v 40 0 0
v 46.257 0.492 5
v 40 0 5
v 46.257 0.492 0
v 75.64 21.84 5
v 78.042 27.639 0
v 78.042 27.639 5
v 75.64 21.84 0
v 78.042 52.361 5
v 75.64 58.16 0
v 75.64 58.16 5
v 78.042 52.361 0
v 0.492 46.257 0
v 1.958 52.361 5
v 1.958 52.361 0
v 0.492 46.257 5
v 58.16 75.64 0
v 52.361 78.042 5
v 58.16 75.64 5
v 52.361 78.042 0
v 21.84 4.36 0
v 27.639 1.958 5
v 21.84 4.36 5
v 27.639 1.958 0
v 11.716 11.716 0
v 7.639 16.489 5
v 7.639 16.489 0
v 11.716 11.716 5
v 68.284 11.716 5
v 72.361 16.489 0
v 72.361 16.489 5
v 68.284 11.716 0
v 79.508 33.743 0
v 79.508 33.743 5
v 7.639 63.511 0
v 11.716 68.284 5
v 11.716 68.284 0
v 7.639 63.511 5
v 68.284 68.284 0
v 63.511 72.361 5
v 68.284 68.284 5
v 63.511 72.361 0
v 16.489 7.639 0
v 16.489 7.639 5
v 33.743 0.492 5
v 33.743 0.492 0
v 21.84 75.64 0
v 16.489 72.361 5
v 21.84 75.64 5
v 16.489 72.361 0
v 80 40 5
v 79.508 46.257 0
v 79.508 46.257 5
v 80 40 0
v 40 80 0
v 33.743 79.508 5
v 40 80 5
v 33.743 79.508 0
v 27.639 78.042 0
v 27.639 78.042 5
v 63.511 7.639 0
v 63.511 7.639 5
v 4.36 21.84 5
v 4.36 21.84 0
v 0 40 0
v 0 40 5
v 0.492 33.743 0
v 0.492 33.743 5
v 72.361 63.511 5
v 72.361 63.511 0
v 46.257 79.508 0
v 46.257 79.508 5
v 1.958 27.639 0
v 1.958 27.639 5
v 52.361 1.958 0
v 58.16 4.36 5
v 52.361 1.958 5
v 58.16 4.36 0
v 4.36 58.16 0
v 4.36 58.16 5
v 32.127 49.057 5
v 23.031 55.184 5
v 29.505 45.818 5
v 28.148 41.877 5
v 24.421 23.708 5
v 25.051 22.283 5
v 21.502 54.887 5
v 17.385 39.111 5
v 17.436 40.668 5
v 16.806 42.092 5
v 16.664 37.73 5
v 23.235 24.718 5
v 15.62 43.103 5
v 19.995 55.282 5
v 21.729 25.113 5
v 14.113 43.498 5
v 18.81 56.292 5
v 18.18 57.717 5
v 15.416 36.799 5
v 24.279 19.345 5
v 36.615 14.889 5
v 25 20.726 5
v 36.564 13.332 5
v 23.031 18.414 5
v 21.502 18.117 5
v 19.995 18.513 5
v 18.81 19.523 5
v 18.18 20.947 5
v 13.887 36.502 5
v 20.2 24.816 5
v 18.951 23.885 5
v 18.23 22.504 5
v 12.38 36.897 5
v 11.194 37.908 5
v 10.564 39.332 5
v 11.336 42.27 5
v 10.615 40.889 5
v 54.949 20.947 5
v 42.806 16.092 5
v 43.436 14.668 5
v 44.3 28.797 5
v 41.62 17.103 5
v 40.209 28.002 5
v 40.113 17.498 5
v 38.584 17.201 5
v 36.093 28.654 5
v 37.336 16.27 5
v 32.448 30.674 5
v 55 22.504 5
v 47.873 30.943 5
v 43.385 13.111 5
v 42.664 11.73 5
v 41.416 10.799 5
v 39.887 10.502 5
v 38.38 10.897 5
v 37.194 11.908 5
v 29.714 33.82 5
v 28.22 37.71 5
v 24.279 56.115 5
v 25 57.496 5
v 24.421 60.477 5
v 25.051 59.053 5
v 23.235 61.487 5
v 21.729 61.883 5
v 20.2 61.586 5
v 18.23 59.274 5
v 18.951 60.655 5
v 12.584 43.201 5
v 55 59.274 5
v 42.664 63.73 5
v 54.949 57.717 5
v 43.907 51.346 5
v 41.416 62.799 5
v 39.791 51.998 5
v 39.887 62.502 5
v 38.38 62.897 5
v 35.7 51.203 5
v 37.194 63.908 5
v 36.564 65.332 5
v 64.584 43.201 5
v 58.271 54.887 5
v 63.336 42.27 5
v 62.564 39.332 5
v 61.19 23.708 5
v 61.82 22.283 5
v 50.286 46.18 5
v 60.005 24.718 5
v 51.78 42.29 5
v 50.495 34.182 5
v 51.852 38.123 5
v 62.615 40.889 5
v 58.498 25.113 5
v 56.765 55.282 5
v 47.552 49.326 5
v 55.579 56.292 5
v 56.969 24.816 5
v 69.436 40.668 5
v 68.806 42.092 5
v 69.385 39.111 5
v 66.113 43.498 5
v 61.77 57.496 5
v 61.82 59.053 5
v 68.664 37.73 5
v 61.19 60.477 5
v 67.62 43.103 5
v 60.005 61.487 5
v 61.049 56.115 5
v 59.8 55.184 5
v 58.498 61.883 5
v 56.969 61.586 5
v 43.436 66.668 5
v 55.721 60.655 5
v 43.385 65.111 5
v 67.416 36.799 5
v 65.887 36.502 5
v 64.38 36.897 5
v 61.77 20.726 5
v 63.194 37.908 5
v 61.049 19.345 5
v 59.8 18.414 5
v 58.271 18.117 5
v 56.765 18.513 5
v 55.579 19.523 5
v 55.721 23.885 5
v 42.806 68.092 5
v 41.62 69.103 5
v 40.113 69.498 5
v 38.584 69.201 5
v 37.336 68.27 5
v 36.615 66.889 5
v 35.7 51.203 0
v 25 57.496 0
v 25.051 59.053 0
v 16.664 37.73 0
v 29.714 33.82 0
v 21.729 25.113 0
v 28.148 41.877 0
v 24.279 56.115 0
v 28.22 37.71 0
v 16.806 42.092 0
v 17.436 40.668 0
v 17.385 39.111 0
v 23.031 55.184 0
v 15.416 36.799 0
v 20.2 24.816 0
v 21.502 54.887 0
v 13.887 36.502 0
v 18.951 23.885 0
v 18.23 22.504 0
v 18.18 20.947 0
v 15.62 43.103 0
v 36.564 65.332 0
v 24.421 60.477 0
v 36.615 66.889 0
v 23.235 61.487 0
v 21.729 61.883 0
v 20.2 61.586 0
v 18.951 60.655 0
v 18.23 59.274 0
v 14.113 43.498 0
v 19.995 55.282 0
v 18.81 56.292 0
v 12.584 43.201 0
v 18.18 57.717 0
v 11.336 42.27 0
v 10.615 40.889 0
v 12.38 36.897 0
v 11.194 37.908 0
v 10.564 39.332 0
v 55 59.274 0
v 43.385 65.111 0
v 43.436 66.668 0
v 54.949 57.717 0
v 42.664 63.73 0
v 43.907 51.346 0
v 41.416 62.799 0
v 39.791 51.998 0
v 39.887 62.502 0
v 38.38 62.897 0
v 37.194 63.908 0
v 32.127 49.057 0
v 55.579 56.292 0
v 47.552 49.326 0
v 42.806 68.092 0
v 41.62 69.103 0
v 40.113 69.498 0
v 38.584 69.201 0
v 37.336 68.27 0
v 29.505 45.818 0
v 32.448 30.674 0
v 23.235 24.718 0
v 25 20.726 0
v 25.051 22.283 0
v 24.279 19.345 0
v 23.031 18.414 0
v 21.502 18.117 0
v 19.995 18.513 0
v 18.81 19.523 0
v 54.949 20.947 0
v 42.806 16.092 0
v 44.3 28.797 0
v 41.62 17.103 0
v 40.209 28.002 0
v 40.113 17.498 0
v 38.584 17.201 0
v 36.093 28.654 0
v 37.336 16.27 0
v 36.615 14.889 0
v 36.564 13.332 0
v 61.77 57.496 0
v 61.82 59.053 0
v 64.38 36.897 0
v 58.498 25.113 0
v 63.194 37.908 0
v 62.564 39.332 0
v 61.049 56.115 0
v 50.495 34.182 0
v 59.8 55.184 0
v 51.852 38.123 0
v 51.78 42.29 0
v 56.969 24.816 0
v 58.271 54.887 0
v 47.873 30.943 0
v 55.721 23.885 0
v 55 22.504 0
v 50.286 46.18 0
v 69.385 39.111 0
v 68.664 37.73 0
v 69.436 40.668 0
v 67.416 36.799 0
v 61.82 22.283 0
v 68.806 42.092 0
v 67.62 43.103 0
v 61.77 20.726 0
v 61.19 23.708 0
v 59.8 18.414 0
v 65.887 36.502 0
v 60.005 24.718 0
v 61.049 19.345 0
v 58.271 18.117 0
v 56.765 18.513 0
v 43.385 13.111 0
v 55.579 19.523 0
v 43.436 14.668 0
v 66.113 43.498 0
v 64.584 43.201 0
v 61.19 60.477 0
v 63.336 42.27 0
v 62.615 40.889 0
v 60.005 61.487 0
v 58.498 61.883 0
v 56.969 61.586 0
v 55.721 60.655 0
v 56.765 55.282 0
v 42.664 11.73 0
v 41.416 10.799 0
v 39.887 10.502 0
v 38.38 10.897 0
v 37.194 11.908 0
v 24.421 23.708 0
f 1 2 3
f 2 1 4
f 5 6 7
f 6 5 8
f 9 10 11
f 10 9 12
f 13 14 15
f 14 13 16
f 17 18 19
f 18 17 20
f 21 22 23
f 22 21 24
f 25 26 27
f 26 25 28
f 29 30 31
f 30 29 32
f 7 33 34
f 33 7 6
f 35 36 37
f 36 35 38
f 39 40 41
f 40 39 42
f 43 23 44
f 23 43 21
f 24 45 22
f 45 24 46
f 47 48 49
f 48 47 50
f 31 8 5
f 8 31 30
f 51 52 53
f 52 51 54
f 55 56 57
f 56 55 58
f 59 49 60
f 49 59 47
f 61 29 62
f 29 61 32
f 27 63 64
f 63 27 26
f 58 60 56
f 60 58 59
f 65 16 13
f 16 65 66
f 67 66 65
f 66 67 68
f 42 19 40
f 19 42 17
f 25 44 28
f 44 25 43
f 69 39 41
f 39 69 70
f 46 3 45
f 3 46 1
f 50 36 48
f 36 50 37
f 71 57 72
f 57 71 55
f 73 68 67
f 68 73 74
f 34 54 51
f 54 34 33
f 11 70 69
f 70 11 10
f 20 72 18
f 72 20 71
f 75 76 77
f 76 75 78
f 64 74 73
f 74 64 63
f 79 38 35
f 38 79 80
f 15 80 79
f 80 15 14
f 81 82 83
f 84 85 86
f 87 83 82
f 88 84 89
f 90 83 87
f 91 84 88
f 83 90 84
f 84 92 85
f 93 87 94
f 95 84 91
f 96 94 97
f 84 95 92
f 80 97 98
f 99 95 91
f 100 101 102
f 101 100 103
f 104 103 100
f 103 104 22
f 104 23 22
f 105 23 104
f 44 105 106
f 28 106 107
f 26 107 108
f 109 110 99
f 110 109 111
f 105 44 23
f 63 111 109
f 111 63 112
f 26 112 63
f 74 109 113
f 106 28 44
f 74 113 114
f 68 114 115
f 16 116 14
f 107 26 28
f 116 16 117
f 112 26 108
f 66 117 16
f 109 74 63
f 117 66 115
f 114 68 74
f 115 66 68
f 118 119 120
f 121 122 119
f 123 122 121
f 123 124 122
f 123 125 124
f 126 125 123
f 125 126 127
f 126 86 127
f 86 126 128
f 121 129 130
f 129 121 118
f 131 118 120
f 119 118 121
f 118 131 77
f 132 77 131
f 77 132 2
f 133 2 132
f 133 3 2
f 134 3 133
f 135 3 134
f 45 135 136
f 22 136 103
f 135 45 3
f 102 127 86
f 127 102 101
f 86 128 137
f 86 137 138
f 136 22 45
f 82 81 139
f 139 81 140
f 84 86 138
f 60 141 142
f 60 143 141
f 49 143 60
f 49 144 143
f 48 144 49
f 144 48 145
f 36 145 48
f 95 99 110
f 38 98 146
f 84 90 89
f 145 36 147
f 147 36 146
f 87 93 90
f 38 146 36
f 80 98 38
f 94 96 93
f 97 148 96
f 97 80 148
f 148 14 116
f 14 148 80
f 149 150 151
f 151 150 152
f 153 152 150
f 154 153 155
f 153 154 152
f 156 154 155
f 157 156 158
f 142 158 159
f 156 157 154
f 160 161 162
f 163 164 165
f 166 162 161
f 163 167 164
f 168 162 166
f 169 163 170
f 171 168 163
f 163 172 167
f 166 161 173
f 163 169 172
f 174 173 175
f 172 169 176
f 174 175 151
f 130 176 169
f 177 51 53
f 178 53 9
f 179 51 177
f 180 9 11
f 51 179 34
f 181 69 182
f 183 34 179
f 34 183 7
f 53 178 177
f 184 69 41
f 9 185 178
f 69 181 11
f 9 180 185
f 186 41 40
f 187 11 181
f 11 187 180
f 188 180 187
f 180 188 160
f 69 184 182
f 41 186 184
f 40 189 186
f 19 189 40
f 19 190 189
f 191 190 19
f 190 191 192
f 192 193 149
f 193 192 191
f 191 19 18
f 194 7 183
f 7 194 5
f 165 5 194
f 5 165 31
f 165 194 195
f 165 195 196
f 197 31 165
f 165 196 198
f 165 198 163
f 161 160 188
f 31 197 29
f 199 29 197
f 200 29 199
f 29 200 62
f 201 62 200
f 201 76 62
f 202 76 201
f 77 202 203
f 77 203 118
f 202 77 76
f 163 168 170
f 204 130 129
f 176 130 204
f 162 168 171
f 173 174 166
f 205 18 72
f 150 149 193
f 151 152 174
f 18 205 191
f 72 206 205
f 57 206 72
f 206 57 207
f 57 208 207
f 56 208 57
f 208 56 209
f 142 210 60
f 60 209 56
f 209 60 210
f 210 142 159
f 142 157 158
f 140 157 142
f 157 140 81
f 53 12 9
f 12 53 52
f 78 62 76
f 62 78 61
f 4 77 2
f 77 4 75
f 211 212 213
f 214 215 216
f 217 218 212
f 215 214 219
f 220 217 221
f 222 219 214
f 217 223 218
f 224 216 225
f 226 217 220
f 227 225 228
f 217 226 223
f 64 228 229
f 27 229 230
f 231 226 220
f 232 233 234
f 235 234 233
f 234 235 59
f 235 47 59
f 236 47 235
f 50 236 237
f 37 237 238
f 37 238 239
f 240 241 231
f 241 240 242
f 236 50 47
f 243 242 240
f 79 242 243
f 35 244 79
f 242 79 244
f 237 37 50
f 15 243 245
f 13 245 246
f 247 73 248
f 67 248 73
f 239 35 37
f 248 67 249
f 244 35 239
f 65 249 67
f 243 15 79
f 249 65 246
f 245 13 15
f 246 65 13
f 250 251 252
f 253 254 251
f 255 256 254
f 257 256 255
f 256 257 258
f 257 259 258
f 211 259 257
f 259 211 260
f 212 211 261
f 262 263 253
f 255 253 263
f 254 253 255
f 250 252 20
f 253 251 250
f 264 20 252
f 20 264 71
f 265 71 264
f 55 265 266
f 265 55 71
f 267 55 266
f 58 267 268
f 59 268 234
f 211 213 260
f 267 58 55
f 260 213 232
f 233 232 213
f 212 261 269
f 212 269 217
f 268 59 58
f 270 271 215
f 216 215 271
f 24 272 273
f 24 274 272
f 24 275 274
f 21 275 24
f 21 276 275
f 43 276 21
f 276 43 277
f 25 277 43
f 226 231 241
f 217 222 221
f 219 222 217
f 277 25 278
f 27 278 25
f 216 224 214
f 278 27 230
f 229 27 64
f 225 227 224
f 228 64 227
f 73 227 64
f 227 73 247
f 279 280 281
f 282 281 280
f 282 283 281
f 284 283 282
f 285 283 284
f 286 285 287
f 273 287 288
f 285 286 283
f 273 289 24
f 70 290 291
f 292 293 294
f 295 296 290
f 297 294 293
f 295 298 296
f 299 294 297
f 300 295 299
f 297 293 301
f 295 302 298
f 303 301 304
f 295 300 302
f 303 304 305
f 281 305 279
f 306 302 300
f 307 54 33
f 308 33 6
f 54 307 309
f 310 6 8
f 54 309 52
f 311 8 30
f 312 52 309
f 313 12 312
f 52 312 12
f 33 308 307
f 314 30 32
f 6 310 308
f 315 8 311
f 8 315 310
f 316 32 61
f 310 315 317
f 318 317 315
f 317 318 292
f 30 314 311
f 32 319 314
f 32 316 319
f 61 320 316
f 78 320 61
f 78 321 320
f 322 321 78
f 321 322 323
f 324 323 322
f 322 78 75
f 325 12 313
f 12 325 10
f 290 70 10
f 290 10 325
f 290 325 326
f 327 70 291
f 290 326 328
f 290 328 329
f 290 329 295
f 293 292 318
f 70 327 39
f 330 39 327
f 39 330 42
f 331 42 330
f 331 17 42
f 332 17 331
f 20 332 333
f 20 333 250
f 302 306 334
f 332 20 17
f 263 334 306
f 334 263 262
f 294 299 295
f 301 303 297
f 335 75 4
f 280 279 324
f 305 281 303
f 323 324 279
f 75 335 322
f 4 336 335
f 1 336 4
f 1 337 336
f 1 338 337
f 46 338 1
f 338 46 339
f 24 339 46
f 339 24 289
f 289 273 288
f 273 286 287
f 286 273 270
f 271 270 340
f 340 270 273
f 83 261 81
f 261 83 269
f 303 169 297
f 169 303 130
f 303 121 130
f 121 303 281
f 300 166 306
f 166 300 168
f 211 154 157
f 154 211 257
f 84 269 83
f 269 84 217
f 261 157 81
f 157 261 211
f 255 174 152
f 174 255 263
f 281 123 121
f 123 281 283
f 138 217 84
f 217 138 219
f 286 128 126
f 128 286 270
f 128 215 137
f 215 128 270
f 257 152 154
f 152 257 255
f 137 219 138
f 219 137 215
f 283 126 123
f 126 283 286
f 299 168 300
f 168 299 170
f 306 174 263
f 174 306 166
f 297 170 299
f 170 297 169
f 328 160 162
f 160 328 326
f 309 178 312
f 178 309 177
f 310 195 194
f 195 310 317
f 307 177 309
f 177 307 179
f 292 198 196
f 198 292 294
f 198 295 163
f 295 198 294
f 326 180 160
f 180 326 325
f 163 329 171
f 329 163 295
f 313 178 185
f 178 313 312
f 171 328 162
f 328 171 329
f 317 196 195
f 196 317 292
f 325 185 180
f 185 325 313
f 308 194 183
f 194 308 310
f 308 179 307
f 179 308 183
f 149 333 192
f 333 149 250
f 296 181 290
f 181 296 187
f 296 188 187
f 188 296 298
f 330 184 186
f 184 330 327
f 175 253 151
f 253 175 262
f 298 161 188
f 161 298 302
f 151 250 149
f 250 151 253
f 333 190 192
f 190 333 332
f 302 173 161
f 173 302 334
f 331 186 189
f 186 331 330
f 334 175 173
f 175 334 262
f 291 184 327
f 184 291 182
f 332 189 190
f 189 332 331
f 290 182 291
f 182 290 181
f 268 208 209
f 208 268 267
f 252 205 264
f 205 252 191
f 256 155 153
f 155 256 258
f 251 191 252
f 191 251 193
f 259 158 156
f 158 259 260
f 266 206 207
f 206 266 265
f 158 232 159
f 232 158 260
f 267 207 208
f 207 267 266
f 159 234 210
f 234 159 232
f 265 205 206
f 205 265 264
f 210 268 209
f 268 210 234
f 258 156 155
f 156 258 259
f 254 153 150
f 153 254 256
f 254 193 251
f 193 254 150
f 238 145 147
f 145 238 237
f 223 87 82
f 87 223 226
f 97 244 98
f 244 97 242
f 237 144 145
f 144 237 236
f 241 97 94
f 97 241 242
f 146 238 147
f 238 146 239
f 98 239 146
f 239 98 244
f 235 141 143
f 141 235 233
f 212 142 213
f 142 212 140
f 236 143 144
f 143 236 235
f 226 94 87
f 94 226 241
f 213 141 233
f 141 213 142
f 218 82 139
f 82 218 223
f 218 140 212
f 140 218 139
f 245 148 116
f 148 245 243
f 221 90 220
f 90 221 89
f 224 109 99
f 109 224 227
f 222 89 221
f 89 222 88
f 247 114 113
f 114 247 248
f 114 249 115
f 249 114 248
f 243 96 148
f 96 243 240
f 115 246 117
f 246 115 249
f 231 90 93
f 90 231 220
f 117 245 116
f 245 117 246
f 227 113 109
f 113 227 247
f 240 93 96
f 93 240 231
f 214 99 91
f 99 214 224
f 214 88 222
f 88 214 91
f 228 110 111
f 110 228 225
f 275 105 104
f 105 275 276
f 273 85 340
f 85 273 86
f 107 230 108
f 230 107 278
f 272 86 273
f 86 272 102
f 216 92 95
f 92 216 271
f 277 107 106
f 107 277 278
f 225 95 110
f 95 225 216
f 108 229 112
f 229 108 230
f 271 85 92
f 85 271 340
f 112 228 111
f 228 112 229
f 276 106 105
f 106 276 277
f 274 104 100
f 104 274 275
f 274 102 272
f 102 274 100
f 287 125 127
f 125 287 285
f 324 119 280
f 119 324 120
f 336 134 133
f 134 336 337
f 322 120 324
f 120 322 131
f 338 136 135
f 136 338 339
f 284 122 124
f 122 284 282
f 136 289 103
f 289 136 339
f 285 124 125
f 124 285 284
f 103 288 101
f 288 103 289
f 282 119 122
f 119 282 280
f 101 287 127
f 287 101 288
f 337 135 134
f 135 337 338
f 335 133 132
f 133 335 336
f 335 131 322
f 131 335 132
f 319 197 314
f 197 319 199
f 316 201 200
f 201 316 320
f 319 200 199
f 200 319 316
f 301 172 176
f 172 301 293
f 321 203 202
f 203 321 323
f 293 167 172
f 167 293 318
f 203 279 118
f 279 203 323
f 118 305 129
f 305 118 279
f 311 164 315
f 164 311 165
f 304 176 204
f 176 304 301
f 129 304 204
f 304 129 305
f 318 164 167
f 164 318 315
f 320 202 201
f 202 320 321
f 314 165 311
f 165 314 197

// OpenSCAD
$fn = 32;

// ----------------------------------------------------------------------
// Spacer plate: round flange R40, 8 bolts
// ----------------------------------------------------------------------

// --- parameters (mm) ---
bore_r = 12;              // centre bore radius
bolt_r = 3.5;             // bolt hole radius
plate_t = 5;              // plate thickness, Z (extrusion height)
flange_r = 40;            // flange radius
n_bolt = 8;               // bolt hole count
ring_r = 26;              // bolt circle radius
fit_tol = 0.05;           // declared fit tolerance (prompt contract)
free_tol = 0.2;           // declared free tolerance (prompt contract)

profile = [[80, 40], [79.508, 46.257], [78.042, 52.361], [75.64, 58.16], [72.361, 63.511], [68.284, 68.284], [63.511, 72.361], [58.16, 75.64], [52.361, 78.042], [46.257, 79.508], [40, 80], [33.743, 79.508], [27.639, 78.042], [21.84, 75.64], [16.489, 72.361], [11.716, 68.284], [7.639, 63.511], [4.36, 58.16], [1.958, 52.361], [0.492, 46.257], [0, 40], [0.492, 33.743], [1.958, 27.639], [4.36, 21.84], [7.639, 16.489], [11.716, 11.716], [16.489, 7.639], [21.84, 4.36], [27.639, 1.958], [33.743, 0.492], [40, 0], [46.257, 0.492], [52.361, 1.958], [58.16, 4.36], [63.511, 7.639], [68.284, 11.716], [72.361, 16.489], [75.64, 21.84], [78.042, 27.639], [79.508, 33.743]];  // primary outline, 40 points, counter clockwise
void_1 = [[51.78, 42.29], [50.286, 46.18], [47.552, 49.326], [43.907, 51.346], [39.791, 51.998], [35.7, 51.203], [32.127, 49.057], [29.505, 45.818], [28.148, 41.877], [28.22, 37.71], [29.714, 33.82], [32.448, 30.674], [36.093, 28.654], [40.209, 28.002], [44.3, 28.797], [47.873, 30.943], [50.495, 34.182], [51.852, 38.123]];  // centre bore, 18 points
void_2 = [[69.436, 40.668], [68.806, 42.092], [67.62, 43.103], [66.113, 43.498], [64.584, 43.201], [63.336, 42.27], [62.615, 40.889], [62.564, 39.332], [63.194, 37.908], [64.38, 36.897], [65.887, 36.502], [67.416, 36.799], [68.664, 37.73], [69.385, 39.111]];  // bolt hole 1, 14 points
void_3 = [[61.82, 59.053], [61.19, 60.477], [60.005, 61.487], [58.498, 61.883], [56.969, 61.586], [55.721, 60.655], [55, 59.274], [54.949, 57.717], [55.579, 56.292], [56.765, 55.282], [58.271, 54.887], [59.8, 55.184], [61.049, 56.115], [61.77, 57.496]];  // bolt hole 2, 14 points
void_4 = [[43.436, 66.668], [42.806, 68.092], [41.62, 69.103], [40.113, 69.498], [38.584, 69.201], [37.336, 68.27], [36.615, 66.889], [36.564, 65.332], [37.194, 63.908], [38.38, 62.897], [39.887, 62.502], [41.416, 62.799], [42.664, 63.73], [43.385, 65.111]];  // bolt hole 3, 14 points
void_5 = [[25.051, 59.053], [24.421, 60.477], [23.235, 61.487], [21.729, 61.883], [20.2, 61.586], [18.951, 60.655], [18.23, 59.274], [18.18, 57.717], [18.81, 56.292], [19.995, 55.282], [21.502, 54.887], [23.031, 55.184], [24.279, 56.115], [25, 57.496]];  // bolt hole 4, 14 points
void_6 = [[17.436, 40.668], [16.806, 42.092], [15.62, 43.103], [14.113, 43.498], [12.584, 43.201], [11.336, 42.27], [10.615, 40.889], [10.564, 39.332], [11.194, 37.908], [12.38, 36.897], [13.887, 36.502], [15.416, 36.799], [16.664, 37.73], [17.385, 39.111]];  // bolt hole 5, 14 points
void_7 = [[25.051, 22.283], [24.421, 23.708], [23.235, 24.718], [21.729, 25.113], [20.2, 24.816], [18.951, 23.885], [18.23, 22.504], [18.18, 20.947], [18.81, 19.523], [19.995, 18.513], [21.502, 18.117], [23.031, 18.414], [24.279, 19.345], [25, 20.726]];  // bolt hole 6, 14 points
void_8 = [[43.436, 14.668], [42.806, 16.092], [41.62, 17.103], [40.113, 17.498], [38.584, 17.201], [37.336, 16.27], [36.615, 14.889], [36.564, 13.332], [37.194, 11.908], [38.38, 10.897], [39.887, 10.502], [41.416, 10.799], [42.664, 11.73], [43.385, 13.111]];  // bolt hole 7, 14 points
void_9 = [[61.82, 22.283], [61.19, 23.708], [60.005, 24.718], [58.498, 25.113], [56.969, 24.816], [55.721, 23.885], [55, 22.504], [54.949, 20.947], [55.579, 19.523], [56.765, 18.513], [58.271, 18.117], [59.8, 18.414], [61.049, 19.345], [61.77, 20.726]];  // bolt hole 8, 14 points

// --- the one profile operation ---
difference() {
  linear_extrude(height = plate_t) polygon(points = profile);
  translate([0, 0, -1])
    linear_extrude(height = plate_t + 2) polygon(points = void_1);
  translate([0, 0, -1])
    linear_extrude(height = plate_t + 2) polygon(points = void_2);
  translate([0, 0, -1])
    linear_extrude(height = plate_t + 2) polygon(points = void_3);
  translate([0, 0, -1])
    linear_extrude(height = plate_t + 2) polygon(points = void_4);
  translate([0, 0, -1])
    linear_extrude(height = plate_t + 2) polygon(points = void_5);
  translate([0, 0, -1])
    linear_extrude(height = plate_t + 2) polygon(points = void_6);
  translate([0, 0, -1])
    linear_extrude(height = plate_t + 2) polygon(points = void_7);
  translate([0, 0, -1])
    linear_extrude(height = plate_t + 2) polygon(points = void_8);
  translate([0, 0, -1])
    linear_extrude(height = plate_t + 2) polygon(points = void_9);
}
